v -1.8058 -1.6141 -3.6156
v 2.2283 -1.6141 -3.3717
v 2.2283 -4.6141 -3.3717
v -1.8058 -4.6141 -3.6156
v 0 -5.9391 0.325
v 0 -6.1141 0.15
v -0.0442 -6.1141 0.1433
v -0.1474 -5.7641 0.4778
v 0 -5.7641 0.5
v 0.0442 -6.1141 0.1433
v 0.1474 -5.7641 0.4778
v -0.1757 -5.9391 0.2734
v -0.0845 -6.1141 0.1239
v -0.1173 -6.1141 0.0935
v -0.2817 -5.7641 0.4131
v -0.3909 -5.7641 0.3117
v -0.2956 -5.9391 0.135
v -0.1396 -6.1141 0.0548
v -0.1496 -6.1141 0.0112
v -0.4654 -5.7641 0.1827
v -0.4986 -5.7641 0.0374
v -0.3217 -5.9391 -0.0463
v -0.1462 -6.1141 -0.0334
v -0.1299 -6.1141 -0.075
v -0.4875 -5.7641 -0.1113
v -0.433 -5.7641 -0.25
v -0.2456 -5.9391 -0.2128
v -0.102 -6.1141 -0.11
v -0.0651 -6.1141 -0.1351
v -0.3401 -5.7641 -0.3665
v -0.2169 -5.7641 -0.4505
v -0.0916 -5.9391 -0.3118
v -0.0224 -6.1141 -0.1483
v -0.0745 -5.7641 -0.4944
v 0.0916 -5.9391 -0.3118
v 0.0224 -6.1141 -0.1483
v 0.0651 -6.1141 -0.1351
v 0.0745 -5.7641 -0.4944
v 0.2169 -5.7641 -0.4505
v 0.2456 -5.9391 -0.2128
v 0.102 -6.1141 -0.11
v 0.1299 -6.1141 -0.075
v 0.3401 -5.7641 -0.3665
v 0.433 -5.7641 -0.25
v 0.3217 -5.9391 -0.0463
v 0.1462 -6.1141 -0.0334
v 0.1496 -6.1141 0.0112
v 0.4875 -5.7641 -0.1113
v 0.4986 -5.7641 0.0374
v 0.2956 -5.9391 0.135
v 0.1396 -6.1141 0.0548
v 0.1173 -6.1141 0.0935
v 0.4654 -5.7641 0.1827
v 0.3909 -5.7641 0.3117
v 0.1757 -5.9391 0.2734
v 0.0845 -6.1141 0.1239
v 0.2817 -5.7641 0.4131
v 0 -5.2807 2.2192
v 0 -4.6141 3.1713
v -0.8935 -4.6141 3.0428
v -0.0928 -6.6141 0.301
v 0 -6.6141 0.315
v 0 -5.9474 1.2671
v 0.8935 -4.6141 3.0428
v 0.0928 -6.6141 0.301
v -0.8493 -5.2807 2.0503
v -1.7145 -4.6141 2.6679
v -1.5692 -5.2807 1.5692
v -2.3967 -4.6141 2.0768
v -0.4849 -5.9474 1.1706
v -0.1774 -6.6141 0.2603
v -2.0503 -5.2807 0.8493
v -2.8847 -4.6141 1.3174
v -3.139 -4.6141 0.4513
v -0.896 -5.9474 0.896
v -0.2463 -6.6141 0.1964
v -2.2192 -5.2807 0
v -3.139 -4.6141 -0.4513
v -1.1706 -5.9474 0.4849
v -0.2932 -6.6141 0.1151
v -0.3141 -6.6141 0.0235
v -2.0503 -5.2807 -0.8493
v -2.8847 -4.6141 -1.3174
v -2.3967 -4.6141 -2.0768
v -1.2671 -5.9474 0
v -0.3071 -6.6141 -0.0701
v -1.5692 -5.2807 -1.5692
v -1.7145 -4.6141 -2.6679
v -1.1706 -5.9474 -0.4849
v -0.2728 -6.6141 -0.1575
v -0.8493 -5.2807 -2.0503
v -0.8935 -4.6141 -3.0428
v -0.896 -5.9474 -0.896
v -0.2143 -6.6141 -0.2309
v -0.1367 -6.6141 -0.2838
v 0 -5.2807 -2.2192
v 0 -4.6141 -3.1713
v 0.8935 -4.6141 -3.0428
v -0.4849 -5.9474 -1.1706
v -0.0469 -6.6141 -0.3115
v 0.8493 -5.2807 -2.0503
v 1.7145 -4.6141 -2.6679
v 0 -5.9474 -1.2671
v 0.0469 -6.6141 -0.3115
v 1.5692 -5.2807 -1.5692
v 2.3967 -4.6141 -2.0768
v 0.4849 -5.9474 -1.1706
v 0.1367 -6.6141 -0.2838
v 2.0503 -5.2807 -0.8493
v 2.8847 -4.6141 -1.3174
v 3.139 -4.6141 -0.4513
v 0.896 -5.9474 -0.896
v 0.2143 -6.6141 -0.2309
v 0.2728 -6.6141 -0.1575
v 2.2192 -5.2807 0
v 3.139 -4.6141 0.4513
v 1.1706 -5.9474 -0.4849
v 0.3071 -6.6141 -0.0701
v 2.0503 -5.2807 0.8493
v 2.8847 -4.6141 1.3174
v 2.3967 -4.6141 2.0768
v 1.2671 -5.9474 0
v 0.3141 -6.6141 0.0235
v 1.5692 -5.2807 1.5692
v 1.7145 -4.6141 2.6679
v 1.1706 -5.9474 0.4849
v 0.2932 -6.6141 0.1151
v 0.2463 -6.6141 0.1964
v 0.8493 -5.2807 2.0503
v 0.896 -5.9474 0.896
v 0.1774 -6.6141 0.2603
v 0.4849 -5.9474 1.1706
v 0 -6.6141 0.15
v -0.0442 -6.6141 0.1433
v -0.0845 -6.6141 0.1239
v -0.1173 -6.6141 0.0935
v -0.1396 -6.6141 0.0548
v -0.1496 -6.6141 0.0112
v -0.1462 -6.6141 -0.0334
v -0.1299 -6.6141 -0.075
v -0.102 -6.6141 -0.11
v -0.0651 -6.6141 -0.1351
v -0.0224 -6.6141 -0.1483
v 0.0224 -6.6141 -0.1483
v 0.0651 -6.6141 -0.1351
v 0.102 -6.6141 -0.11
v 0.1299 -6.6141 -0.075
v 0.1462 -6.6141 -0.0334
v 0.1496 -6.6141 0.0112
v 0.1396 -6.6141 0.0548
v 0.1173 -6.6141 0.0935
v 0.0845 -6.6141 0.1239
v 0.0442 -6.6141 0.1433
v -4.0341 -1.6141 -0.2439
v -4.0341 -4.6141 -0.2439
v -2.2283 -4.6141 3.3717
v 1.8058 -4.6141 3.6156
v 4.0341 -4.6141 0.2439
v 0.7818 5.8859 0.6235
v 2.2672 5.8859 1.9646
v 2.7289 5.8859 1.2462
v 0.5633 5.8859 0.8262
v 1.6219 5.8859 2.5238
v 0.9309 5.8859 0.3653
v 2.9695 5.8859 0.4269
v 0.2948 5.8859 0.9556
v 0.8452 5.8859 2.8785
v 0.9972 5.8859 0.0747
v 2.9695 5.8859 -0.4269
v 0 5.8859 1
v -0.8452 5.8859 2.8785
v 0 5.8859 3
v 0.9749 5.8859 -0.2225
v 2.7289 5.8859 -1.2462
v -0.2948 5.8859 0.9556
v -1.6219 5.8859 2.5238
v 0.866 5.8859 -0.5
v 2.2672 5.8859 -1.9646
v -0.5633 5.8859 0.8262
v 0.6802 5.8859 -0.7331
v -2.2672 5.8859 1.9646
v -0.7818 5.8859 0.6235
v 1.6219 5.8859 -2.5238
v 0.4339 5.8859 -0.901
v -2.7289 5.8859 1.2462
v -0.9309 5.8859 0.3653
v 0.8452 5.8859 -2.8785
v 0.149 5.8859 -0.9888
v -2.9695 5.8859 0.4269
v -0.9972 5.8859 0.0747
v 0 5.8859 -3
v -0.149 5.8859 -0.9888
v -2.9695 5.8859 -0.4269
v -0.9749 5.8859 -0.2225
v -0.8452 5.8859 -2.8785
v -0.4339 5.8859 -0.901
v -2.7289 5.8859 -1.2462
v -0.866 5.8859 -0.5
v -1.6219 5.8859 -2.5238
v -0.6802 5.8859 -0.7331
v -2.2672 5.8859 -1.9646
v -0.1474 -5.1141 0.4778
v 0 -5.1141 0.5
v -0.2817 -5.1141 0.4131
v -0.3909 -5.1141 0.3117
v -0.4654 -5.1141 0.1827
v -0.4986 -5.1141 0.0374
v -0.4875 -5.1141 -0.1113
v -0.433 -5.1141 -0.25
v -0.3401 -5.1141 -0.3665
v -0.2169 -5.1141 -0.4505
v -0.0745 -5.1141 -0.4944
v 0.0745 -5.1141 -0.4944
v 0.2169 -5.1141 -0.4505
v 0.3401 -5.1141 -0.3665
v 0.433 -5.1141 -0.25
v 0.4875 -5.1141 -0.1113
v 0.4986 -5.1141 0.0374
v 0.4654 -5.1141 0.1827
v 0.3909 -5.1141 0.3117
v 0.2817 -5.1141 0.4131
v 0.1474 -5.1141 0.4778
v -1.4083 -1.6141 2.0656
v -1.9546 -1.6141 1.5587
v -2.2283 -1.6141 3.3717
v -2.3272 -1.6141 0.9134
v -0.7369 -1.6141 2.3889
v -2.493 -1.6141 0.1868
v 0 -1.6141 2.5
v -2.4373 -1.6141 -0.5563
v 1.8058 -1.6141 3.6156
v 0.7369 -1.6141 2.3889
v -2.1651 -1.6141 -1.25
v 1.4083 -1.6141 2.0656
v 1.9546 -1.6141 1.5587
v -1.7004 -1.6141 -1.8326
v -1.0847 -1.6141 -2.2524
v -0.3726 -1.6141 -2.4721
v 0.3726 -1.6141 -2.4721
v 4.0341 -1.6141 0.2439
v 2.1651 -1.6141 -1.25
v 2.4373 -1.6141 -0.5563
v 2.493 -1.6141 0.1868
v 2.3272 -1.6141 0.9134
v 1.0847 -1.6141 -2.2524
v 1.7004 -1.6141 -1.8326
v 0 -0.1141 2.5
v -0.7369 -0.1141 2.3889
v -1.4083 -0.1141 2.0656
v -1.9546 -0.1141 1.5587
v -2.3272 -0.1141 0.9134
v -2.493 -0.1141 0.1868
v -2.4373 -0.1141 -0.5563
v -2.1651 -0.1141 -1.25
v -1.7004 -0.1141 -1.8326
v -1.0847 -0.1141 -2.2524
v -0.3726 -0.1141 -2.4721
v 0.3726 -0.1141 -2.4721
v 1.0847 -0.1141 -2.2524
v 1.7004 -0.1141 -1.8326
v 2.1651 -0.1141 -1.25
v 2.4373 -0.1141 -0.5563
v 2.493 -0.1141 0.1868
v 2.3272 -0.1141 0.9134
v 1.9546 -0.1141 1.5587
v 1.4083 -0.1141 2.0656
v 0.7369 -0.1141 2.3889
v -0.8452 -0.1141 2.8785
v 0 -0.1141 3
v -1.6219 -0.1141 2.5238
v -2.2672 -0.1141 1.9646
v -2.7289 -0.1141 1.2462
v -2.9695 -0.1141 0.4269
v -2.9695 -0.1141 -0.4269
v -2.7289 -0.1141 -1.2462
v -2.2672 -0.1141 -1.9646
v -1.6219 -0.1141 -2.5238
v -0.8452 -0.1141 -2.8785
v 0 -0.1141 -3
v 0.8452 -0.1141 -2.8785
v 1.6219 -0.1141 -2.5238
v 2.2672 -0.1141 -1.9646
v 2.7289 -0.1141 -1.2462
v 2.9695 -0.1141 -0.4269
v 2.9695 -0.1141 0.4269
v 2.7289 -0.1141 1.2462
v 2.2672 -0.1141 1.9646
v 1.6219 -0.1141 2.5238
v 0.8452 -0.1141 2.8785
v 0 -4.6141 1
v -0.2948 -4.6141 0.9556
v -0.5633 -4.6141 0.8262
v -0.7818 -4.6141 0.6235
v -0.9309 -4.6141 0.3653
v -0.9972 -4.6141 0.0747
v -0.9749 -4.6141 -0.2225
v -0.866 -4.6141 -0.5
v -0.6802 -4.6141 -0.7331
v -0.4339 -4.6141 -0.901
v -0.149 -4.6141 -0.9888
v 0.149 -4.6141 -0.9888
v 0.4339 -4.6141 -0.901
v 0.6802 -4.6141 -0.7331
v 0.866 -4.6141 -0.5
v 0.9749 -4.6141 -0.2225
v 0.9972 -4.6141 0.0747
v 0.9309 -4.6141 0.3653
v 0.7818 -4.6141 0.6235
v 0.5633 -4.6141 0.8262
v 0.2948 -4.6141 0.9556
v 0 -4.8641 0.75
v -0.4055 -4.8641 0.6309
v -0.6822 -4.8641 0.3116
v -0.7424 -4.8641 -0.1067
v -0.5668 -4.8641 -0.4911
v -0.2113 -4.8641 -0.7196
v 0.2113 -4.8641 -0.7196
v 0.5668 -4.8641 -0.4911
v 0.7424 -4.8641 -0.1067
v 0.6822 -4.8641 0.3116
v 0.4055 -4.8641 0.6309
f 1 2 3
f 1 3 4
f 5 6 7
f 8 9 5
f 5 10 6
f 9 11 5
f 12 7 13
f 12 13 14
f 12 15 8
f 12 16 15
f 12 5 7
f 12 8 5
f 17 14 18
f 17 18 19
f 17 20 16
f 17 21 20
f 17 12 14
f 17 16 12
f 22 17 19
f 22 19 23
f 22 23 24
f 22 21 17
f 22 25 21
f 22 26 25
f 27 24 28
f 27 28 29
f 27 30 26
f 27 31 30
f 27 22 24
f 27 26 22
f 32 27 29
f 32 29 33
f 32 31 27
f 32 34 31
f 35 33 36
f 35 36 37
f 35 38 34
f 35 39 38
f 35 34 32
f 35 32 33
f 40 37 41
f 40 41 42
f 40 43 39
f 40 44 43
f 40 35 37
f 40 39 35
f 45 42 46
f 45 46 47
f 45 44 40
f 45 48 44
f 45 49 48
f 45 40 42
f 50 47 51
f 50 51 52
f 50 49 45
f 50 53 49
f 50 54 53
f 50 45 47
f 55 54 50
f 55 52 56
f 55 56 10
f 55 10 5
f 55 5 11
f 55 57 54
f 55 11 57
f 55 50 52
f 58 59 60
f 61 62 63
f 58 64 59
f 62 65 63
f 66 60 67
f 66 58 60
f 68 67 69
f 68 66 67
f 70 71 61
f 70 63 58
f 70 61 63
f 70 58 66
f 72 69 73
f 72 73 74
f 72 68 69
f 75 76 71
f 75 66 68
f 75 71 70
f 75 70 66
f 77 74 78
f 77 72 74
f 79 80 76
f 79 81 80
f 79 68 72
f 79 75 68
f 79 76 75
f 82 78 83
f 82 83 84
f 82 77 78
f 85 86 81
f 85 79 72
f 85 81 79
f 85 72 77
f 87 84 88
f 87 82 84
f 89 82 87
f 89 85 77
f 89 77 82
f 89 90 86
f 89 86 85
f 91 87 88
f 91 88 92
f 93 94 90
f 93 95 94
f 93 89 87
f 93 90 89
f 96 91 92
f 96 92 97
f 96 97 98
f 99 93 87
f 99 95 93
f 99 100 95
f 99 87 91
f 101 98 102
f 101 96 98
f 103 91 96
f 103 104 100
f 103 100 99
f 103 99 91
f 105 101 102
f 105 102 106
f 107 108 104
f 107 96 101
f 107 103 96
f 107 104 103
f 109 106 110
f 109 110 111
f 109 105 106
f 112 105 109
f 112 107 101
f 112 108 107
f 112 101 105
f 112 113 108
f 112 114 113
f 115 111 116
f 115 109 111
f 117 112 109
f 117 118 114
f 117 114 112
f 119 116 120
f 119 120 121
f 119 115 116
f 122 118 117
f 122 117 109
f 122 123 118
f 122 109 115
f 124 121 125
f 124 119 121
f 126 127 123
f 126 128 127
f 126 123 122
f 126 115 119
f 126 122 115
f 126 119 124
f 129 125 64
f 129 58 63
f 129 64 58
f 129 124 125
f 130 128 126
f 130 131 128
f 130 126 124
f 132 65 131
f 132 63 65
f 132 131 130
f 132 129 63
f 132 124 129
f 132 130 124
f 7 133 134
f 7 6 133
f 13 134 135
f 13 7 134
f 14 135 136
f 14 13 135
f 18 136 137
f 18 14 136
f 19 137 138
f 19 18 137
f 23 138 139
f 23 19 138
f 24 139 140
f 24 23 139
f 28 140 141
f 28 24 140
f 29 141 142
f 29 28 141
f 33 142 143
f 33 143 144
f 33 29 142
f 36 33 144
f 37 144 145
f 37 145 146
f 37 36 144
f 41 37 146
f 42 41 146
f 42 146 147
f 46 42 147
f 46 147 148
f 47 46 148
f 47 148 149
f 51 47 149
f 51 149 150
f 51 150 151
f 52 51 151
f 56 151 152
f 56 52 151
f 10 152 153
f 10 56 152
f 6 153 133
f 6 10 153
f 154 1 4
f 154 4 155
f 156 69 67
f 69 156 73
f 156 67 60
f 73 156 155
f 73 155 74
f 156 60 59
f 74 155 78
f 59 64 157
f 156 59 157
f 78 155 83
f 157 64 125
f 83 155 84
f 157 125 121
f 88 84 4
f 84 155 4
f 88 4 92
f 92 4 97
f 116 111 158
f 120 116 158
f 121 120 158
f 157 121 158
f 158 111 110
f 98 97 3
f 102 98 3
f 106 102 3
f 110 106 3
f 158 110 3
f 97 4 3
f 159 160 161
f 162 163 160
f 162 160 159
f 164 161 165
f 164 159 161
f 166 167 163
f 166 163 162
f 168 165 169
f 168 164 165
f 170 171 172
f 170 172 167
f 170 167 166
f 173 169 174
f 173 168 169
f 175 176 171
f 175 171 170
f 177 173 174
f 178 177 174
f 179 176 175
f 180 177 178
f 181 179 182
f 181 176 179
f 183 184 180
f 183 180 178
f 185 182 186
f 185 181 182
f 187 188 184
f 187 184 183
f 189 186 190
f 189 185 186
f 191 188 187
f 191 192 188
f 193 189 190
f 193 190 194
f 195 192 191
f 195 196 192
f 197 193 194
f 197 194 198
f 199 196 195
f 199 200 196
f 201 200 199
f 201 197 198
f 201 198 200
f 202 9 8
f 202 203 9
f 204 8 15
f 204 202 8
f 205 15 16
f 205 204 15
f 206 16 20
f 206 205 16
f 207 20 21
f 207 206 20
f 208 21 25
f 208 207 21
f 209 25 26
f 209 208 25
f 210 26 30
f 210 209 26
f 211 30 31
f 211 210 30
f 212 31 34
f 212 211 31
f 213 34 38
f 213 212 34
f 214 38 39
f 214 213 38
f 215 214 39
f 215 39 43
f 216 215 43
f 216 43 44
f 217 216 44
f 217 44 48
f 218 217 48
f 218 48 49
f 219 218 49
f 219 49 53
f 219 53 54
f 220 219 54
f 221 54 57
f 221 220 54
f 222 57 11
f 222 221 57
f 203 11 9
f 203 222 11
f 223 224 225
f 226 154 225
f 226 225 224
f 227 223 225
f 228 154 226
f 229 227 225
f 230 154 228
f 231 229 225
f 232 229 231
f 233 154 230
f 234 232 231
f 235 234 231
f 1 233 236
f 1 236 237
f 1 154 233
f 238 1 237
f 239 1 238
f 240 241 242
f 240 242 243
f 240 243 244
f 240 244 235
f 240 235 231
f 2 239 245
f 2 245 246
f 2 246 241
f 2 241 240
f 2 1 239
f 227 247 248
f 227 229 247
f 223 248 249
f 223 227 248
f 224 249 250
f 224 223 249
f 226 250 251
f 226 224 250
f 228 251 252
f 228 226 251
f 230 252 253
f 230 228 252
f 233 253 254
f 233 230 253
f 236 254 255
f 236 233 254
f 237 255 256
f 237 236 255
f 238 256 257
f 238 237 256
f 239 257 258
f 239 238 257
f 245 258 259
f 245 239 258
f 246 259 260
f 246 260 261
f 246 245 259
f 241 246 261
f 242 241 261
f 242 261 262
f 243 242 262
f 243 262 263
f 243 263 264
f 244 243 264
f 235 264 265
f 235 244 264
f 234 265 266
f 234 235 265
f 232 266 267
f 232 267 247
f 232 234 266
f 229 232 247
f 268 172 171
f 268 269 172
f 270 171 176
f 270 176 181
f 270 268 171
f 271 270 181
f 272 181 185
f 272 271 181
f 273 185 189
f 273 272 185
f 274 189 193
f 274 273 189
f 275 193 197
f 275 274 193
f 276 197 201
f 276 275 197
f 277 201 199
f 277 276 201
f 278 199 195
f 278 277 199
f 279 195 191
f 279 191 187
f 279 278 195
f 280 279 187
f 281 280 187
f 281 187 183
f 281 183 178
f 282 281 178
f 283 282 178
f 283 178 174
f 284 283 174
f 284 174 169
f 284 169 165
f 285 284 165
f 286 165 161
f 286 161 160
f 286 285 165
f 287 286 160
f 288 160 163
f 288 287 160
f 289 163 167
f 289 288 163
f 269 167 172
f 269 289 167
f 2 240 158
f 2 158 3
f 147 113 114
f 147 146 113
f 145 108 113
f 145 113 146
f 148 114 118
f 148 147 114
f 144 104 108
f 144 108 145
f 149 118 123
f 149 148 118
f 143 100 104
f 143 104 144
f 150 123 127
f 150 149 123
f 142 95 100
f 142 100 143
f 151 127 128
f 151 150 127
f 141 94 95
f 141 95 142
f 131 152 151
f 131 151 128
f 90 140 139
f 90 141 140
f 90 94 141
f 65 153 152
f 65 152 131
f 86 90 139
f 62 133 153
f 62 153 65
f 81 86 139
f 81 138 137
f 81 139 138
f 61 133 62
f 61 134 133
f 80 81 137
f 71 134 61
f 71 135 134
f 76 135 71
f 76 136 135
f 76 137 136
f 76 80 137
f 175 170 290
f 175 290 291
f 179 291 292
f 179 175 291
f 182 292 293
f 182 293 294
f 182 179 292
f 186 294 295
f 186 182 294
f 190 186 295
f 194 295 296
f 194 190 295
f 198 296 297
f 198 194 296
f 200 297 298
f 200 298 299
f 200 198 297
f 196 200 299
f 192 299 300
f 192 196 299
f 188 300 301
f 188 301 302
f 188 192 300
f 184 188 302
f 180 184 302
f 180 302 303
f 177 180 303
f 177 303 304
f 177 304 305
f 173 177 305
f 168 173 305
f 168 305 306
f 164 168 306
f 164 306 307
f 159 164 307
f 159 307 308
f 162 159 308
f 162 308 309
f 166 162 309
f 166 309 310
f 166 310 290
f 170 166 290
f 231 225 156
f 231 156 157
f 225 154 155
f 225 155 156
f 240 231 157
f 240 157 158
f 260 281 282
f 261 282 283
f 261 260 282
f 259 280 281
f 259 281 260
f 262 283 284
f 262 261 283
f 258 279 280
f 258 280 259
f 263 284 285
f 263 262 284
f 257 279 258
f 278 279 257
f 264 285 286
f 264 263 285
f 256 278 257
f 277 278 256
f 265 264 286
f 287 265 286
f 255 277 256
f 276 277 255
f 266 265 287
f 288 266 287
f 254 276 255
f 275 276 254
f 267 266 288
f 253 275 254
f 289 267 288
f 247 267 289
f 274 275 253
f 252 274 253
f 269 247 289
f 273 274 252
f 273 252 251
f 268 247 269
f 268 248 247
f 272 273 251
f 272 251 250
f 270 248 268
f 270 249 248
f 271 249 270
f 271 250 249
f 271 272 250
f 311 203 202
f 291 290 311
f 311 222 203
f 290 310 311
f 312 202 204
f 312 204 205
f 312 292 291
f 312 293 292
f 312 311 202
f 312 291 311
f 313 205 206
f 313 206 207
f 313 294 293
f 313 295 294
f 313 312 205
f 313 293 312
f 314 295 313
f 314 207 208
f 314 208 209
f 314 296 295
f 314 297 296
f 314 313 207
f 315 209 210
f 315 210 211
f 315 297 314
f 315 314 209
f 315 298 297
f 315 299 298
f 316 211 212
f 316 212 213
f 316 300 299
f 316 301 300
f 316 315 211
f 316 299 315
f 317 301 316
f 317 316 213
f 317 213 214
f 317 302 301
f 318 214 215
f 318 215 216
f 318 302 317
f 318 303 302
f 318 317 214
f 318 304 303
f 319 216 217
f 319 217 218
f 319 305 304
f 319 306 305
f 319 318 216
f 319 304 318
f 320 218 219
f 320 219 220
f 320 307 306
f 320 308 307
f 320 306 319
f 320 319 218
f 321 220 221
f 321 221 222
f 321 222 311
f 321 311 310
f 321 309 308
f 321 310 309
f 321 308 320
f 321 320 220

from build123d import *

# Parameters (mm, degrees)
P_IDAT_VYSUNUT_M1_DEPTH  = 3
SKICA3_R                 = 1
ODEBRAT_VYSUNUT_M1_DEPTH = 3


with BuildPart() as part:
    # Skica1 → Rotovat1 (revolve)
    with BuildSketch(Plane.XY, mode=Mode.PRIVATE) as rotovat1_sk:
        Polygon((1, 5.88592233), (3, 5.88592233), (3, -0.11407767), (2.5, -0.11407767), (2.5, -1.61407767), (3.5, -1.61407767), (3.5, -4.61407767), (3.171296013, -4.61407767), (0.315, -6.61407767), (0.15, -6.61407767), (0.15, -6.11407767), (0.5, -5.76407767), (0.5, -5.11407767), (1, -4.61407767), align=None)
    revolve(rotovat1_sk.sketch.rotate(Axis((0, 5.88592233, 0), (0, -1, 0)), 90), axis=Axis((0, 5.88592233, 0), (0, -1, 0)))

    # Skica2 → Přidat vysunutím1 (add)
    with BuildSketch(Plane(origin=(0, -1.61407767, 0), x_dir=(1, 0, 0), z_dir=(0, 1, 0))):
        Polygon((-4.03408582, 0.243895321), (-2.228262454, -3.371673141), (1.805823366, -3.615568462), (4.03408582, -0.243895321), (2.228262454, 3.371673141), (-1.805823366, 3.615568462), align=None)
    extrude(amount=-P_IDAT_VYSUNUT_M1_DEPTH)

    # Skica3 → Odebrat vysunutím1 (cut)
    with BuildSketch(Plane(origin=(0, -1.61407767, 0), x_dir=(1, 0, 0), z_dir=(0, 1, 0))):
        with Locations(Location((0, 0, 0), (0, 0, 270))):
            Circle(SKICA3_R)
    extrude(amount=-ODEBRAT_VYSUNUT_M1_DEPTH, mode=Mode.SUBTRACT)


solid = part.part
